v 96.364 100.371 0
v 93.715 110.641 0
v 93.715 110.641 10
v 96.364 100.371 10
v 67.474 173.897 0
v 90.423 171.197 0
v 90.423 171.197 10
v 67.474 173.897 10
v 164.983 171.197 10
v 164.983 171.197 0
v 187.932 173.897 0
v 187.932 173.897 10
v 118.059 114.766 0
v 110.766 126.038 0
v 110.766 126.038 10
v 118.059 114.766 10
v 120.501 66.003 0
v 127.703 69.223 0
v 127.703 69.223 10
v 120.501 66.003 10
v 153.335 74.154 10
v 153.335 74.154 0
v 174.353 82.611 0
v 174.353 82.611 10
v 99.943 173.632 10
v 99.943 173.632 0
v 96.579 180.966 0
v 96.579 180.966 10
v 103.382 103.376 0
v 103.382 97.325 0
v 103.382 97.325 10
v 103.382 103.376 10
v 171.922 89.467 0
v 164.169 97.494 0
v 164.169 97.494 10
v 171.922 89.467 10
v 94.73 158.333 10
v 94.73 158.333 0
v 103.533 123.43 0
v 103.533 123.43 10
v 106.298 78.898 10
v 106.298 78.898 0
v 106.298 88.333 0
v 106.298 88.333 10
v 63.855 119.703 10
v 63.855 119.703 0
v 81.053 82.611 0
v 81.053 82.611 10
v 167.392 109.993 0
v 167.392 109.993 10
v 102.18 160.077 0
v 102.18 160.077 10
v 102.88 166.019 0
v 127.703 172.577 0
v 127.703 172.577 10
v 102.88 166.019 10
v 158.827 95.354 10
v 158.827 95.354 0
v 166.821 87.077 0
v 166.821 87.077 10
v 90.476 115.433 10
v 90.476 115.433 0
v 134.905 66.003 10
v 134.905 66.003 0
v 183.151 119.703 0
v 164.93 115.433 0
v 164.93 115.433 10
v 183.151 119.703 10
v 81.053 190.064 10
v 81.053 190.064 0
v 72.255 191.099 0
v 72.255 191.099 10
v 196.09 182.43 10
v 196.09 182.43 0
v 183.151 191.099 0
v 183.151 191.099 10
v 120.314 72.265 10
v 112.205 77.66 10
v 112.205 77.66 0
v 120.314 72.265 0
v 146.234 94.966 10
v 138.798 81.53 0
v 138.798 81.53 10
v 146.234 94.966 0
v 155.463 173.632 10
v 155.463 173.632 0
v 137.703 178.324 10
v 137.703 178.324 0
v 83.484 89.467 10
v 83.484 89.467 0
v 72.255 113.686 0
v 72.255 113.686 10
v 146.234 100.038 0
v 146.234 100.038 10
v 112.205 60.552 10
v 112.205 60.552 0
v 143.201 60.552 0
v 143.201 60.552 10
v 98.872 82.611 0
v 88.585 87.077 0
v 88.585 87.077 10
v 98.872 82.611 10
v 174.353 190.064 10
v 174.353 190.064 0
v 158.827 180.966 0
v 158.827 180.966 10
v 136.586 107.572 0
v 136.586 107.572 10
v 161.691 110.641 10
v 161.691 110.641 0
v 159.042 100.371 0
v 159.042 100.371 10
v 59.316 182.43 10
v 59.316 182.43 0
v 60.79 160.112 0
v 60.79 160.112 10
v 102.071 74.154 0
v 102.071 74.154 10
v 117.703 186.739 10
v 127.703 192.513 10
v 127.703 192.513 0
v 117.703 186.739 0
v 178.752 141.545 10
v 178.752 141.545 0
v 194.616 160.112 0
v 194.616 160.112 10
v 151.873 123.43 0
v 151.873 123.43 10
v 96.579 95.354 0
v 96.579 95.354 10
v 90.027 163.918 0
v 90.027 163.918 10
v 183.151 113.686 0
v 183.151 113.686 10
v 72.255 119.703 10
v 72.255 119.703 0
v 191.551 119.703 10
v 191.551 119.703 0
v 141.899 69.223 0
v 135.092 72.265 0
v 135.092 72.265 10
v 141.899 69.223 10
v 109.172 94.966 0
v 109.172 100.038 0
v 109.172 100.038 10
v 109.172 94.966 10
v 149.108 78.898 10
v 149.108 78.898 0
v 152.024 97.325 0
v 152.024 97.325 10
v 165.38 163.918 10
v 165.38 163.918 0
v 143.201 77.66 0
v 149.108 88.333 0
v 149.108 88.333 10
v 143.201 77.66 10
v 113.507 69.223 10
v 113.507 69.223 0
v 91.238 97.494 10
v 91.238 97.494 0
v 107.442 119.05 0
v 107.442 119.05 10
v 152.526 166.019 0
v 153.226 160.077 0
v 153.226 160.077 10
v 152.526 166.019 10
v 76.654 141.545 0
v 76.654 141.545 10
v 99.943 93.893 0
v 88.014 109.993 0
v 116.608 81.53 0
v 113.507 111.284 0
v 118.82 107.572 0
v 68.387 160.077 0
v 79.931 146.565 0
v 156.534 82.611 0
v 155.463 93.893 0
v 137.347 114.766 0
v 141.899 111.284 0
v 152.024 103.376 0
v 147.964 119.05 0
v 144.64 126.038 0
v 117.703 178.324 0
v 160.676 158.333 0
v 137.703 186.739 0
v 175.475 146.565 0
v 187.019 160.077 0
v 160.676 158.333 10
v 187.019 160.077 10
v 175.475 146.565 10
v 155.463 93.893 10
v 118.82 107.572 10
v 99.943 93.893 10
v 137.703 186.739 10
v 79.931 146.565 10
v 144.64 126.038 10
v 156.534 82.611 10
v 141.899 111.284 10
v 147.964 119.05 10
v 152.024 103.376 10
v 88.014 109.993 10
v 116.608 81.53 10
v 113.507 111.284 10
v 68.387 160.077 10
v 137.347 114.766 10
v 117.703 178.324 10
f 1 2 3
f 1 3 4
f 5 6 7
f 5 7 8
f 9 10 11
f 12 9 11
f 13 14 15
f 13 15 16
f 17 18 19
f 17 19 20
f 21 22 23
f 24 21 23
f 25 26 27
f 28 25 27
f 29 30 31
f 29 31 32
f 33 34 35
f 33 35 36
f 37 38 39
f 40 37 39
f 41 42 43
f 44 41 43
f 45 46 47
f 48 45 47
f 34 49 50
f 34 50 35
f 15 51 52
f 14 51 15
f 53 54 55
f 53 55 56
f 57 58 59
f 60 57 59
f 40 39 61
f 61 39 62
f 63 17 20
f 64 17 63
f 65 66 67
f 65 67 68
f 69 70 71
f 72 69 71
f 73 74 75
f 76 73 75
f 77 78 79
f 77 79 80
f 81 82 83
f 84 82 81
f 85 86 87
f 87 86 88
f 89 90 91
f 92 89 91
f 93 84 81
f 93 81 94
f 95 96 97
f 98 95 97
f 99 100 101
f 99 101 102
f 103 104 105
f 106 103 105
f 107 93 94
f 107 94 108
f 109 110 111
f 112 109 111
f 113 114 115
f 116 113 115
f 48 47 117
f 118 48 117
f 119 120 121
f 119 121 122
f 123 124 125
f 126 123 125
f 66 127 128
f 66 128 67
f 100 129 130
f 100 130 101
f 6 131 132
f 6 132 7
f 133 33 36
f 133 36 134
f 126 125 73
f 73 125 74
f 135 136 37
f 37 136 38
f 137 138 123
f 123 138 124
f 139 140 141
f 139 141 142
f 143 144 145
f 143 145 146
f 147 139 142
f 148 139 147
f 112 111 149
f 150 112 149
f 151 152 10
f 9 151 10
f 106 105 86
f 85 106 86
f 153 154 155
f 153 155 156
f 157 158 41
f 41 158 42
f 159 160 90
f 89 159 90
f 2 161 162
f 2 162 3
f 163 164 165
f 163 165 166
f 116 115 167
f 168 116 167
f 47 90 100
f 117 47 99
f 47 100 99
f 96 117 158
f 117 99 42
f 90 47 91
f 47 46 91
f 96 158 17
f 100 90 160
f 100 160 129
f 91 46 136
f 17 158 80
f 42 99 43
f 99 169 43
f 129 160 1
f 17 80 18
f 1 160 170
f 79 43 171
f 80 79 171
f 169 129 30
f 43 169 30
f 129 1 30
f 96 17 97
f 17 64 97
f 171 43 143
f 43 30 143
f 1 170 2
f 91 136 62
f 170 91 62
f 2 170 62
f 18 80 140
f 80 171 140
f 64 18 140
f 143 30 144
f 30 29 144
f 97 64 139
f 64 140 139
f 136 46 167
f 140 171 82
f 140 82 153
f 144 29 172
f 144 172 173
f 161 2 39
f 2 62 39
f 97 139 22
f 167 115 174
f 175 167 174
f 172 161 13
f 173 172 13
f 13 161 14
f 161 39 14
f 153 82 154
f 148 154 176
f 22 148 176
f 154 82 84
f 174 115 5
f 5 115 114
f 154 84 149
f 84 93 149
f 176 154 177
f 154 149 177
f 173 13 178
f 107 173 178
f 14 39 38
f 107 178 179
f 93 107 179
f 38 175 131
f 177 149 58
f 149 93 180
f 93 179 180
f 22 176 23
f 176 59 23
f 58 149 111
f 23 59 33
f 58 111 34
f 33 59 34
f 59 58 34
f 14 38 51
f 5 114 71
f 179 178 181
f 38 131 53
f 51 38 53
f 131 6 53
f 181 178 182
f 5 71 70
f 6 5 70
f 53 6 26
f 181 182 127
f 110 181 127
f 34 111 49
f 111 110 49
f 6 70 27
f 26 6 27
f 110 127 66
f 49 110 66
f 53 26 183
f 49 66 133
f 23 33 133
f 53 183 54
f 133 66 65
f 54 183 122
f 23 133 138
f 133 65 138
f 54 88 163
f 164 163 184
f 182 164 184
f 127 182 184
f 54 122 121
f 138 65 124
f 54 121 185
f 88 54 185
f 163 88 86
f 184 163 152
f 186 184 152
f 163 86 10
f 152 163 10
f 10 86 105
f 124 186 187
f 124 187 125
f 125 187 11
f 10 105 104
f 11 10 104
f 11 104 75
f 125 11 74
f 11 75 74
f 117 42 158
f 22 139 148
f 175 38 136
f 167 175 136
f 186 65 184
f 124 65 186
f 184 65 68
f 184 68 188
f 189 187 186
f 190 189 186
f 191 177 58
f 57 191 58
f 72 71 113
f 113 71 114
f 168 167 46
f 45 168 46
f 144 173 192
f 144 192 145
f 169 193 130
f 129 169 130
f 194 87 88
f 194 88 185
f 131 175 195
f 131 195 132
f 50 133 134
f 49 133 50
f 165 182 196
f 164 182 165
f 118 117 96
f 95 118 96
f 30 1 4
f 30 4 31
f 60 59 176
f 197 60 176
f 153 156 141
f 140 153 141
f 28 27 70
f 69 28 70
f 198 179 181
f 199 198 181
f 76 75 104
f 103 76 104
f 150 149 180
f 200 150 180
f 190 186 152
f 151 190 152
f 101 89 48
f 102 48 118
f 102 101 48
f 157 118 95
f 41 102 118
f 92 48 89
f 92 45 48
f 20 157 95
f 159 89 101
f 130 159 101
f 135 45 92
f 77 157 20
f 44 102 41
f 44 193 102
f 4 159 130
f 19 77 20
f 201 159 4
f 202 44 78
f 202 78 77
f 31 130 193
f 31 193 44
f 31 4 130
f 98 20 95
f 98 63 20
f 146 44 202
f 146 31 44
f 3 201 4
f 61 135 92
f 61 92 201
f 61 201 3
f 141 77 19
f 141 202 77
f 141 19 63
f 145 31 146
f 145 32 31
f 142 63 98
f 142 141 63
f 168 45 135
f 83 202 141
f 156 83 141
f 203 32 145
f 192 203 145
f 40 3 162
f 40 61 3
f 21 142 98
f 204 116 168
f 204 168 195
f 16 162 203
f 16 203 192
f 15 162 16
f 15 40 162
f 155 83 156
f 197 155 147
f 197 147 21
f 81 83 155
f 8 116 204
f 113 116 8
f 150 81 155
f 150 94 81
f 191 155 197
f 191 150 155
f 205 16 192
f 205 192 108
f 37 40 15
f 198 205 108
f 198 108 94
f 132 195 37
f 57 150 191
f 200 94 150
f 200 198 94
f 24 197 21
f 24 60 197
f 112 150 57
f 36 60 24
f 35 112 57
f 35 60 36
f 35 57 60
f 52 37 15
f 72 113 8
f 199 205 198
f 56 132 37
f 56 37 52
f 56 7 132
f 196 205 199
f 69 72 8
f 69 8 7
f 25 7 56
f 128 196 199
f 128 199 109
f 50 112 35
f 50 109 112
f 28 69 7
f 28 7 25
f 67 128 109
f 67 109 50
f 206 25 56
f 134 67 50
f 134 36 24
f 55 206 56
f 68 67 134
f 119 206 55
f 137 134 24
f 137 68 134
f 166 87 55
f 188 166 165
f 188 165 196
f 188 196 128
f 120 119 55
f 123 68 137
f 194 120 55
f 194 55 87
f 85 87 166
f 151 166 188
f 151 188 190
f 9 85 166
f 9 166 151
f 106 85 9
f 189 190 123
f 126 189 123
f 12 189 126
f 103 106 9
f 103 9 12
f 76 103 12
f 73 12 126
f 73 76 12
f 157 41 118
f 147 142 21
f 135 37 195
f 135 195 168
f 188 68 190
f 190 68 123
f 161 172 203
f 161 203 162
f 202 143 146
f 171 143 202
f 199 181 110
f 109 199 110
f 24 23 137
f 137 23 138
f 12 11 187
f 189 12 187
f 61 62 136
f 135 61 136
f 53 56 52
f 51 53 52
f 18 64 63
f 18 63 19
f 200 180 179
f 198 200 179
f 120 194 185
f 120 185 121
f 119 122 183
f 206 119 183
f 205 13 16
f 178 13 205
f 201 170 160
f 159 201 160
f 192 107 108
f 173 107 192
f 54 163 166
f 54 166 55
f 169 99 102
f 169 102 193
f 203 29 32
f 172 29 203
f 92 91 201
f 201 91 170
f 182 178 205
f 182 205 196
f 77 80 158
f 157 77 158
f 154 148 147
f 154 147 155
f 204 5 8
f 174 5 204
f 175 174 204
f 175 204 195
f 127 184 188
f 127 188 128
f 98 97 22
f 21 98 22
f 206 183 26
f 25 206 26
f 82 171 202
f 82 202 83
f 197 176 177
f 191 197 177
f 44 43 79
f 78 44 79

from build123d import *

# Parameters (mm, degrees)
BOSS_EXTRUDE1_DEPTH = 10
BOSS_EXTRUDE2_DEPTH = 10


with BuildPart() as part:
    # Sketch1 → Boss-Extrude1 (new body)
    with BuildSketch(Plane.XY):
        Polygon((127.703033666, 180.965914282), (99.942912825, 173.631948997), (96.578915919, 180.965914282), (81.052776354, 190.063780037), (72.254630601, 191.098856008), (59.316180963, 182.430094751), (60.790297203, 160.111634548), (76.653703478, 141.544593896), (63.855106266, 119.702899162), (81.052776354, 82.611392369), (102.070810081, 74.154129577), (112.205480651, 60.552230042), (143.200586682, 60.552230042), (153.335257251, 74.154129577), (174.353290979, 82.611392369), (191.550961067, 119.702899162), (178.752363855, 141.544593896), (194.61577013, 160.111634548), (196.089886369, 182.430094751), (183.151436732, 191.098856008), (174.353290979, 190.063780037), (158.827151414, 180.965914282), (155.463154508, 173.631948997), align=None)
        Polygon((67.474305777, 173.897244281), (68.387150649, 160.076562168), (79.931030202, 146.565234447), (90.026558446, 163.917673436), (90.423397797, 171.197351102), align=None, mode=Mode.SUBTRACT)
        Polygon((127.703033666, 172.577463554), (102.879615929, 166.019347867), (102.18046467, 160.076562168), (110.765700355, 126.038475421), (118.058737252, 114.76612201), (137.34733008, 114.76612201), (144.640366978, 126.038475421), (153.225602663, 160.076562168), (152.526451404, 166.019347867), align=None, mode=Mode.SUBTRACT)
        Polygon((136.586125745, 107.572158068), (118.819941588, 107.572158068), (109.172351708, 100.037547324), (109.172351708, 94.966141376), (116.6084589, 81.530126894), (138.797608433, 81.530126894), (146.233715625, 94.966141376), (146.233715625, 100.037547324), align=None, mode=Mode.SUBTRACT)
        Polygon((127.703033666, 69.222589269), (120.501208911, 66.003395505), (134.904858422, 66.003395505), align=None, mode=Mode.SUBTRACT)
        Polygon((106.298254857, 88.333075052), (112.205480651, 77.659537236), (120.314301927, 72.265301124), (113.507293972, 69.222589269), (106.298254857, 78.897953172), align=None, mode=Mode.SUBTRACT)
        Polygon((88.584904383, 87.077096627), (98.87165084, 82.611392369), (99.942912825, 93.893171548), (96.578915919, 95.353557042), align=None, mode=Mode.SUBTRACT)
        Polygon((88.013567695, 109.993210583), (91.237528294, 97.494221969), (83.484010106, 89.466752149), (72.254630601, 113.685998364), align=None, mode=Mode.SUBTRACT)
        Polygon((93.714725872, 110.641384033), (96.363799956, 100.371175761), (103.381612359, 97.324588109), (103.381612359, 103.375859749), (113.507293972, 111.283852358), (107.442428718, 119.04952661), align=None, mode=Mode.SUBTRACT)
        Polygon((72.254630601, 119.702899162), (94.729608094, 158.333436003), (103.533048595, 123.430227468), (90.476275499, 115.433025678), align=None, mode=Mode.SUBTRACT)
        Polygon((164.929791833, 115.433025678), (183.151436732, 119.702899162), (160.676459238, 158.333436003), (151.873018738, 123.430227468), align=None, mode=Mode.SUBTRACT)
        Polygon((147.963638615, 119.04952661), (161.691341461, 110.641384033), (159.042267377, 100.371175761), (152.024454974, 97.324588109), (152.024454974, 103.375859749), (141.898773361, 111.283852358), align=None, mode=Mode.SUBTRACT)
        Polygon((183.151436732, 113.685998364), (167.392499638, 109.993210583), (164.168539039, 97.494221969), (171.922057227, 89.466752149), align=None, mode=Mode.SUBTRACT)
        Polygon((158.827151414, 95.353557042), (166.821162949, 87.077096627), (156.534416493, 82.611392369), (155.463154508, 93.893171548), align=None, mode=Mode.SUBTRACT)
        Polygon((149.107812476, 78.897953172), (149.107812476, 88.333075052), (143.200586682, 77.659537236), (135.091765405, 72.265301124), (141.898773361, 69.222589269), align=None, mode=Mode.SUBTRACT)
        Polygon((164.982669535, 171.197351102), (187.931761556, 173.897244281), (187.018916684, 160.076562168), (175.475037131, 146.565234447), (165.379508887, 163.917673436), align=None, mode=Mode.SUBTRACT)
    extrude(amount=BOSS_EXTRUDE1_DEPTH)

    # Sketch2 → Boss-Extrude2 (add)
    with BuildSketch(Plane.XY.offset(10)):
        Polygon((137.703033666, 186.739416974), (127.703033666, 192.512919666), (117.703033666, 186.739416974), (117.703033666, 175.19241159), (123.949734855, 171.585876977), (127.703033666, 172.577463554), (131.456332478, 171.585876977), (137.703033666, 175.19241159), align=None)
    extrude(amount=-BOSS_EXTRUDE2_DEPTH)


solid = part.part
